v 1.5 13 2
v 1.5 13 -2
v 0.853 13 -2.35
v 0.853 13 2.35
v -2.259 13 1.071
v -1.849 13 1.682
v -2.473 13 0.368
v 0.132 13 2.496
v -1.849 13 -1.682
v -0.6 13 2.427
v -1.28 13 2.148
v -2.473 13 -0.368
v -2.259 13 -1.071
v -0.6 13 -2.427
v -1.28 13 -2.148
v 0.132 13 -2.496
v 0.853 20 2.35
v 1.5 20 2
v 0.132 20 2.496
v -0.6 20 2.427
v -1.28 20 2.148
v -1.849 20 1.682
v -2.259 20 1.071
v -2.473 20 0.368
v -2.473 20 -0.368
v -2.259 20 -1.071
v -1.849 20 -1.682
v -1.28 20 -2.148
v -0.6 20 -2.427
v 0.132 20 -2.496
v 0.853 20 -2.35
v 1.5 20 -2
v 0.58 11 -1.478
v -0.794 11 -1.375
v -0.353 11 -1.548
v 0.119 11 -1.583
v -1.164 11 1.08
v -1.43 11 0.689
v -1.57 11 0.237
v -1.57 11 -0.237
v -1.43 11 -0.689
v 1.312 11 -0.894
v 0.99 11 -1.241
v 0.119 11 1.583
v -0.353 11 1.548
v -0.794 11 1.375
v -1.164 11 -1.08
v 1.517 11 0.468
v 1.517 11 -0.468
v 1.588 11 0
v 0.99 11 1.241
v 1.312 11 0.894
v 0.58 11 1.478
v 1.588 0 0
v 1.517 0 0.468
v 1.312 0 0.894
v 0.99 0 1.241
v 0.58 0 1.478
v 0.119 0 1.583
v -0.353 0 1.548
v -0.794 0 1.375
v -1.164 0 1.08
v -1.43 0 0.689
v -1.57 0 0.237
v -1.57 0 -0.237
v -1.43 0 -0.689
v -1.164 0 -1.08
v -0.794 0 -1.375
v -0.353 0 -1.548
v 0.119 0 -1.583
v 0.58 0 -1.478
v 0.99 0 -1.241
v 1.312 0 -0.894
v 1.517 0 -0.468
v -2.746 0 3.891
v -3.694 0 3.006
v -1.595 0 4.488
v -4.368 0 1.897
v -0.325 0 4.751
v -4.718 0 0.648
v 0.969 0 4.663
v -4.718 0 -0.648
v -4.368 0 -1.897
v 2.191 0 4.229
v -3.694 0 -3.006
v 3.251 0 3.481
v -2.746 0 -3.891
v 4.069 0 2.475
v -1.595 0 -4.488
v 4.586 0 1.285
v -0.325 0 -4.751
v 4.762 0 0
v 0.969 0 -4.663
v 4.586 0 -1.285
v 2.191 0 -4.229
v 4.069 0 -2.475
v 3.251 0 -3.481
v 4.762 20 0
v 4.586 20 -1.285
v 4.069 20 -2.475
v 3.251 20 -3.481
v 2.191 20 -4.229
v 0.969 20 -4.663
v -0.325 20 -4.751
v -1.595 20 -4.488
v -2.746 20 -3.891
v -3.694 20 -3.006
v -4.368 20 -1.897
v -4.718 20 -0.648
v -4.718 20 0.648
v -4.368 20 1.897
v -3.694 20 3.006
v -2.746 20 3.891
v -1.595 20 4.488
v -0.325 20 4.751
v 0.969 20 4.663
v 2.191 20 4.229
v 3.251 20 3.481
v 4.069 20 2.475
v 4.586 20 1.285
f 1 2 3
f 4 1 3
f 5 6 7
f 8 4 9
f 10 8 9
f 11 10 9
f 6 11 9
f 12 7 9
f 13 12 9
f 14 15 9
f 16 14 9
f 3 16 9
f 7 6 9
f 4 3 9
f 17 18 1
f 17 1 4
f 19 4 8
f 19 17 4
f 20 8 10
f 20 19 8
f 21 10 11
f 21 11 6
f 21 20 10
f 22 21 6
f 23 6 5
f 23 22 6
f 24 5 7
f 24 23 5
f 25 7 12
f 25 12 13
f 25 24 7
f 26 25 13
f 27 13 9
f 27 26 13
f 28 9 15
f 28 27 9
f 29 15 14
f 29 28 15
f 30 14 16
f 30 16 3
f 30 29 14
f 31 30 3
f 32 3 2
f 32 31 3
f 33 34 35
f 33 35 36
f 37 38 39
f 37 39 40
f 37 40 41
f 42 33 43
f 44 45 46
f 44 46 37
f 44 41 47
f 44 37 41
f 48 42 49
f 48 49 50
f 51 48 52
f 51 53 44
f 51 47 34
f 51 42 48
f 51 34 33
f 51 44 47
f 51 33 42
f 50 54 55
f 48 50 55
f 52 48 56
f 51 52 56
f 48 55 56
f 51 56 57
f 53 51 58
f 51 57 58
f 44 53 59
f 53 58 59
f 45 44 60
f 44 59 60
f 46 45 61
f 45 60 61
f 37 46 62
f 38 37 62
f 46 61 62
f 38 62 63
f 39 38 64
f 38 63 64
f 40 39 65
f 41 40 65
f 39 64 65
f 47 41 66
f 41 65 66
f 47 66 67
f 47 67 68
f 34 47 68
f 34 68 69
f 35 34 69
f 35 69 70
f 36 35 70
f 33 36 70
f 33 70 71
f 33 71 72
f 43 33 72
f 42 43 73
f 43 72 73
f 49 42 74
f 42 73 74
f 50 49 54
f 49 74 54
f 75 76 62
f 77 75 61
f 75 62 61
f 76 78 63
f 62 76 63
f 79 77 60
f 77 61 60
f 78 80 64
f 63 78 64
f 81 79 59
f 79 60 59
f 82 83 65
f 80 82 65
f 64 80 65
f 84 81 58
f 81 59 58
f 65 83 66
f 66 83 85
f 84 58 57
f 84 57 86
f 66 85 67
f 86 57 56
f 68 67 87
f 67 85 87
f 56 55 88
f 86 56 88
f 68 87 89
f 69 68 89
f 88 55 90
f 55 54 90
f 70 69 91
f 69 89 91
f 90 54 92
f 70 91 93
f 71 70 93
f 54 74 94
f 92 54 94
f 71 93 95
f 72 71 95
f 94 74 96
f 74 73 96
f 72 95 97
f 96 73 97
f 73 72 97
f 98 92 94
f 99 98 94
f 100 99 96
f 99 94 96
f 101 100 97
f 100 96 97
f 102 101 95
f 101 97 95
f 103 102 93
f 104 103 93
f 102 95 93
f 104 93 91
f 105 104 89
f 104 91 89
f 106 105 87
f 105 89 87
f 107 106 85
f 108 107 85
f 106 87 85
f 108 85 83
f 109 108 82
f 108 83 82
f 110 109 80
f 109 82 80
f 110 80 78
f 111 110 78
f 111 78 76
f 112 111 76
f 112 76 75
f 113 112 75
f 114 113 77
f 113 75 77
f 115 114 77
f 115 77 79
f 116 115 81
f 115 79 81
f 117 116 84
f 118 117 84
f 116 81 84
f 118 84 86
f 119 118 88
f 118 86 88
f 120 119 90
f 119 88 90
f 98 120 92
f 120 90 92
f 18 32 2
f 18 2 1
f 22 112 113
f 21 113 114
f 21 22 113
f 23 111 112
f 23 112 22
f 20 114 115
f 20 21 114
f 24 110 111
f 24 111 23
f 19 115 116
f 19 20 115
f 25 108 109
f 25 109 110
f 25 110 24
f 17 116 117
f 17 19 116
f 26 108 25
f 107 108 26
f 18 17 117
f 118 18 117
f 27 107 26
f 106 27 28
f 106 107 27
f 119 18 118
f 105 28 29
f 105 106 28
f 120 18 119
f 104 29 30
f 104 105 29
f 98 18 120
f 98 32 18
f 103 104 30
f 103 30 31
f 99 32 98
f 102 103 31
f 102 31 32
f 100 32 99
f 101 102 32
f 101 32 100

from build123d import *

# Parameters (mm, degrees)
SKETCH1_R           = 4.7625
BOSS_EXTRUDE1_DEPTH = 20
CUT_EXTRUDE1_DEPTH  = 7
SKETCH3_R           = 1.5875
CUT_EXTRUDE2_DEPTH  = 11


with BuildPart() as part:
    # Sketch1 → Boss-Extrude1 (new body)
    with BuildSketch(Plane(origin=(0, 0, 0), x_dir=(1, 0, 0), z_dir=(0, 1, 0))):
        Circle(SKETCH1_R)
    extrude(amount=BOSS_EXTRUDE1_DEPTH)

    # Sketch2 → Cut-Extrude1 (cut)
    with BuildSketch(Plane(origin=(0, 20, 0), x_dir=(1, 0, 0), z_dir=(0, 1, 0))):
        with BuildLine():
            Line((1.5, 2), (1.5, -2))
            ThreePointArc((1.5, -2), (-2.5, 0), (1.5, 2))
        make_face()
    extrude(amount=-CUT_EXTRUDE1_DEPTH, mode=Mode.SUBTRACT)

    # Sketch3 → Cut-Extrude2 (cut)
    with BuildSketch(Plane.XZ):
        Circle(SKETCH3_R)
    extrude(amount=-CUT_EXTRUDE2_DEPTH, mode=Mode.SUBTRACT)


solid = part.part
